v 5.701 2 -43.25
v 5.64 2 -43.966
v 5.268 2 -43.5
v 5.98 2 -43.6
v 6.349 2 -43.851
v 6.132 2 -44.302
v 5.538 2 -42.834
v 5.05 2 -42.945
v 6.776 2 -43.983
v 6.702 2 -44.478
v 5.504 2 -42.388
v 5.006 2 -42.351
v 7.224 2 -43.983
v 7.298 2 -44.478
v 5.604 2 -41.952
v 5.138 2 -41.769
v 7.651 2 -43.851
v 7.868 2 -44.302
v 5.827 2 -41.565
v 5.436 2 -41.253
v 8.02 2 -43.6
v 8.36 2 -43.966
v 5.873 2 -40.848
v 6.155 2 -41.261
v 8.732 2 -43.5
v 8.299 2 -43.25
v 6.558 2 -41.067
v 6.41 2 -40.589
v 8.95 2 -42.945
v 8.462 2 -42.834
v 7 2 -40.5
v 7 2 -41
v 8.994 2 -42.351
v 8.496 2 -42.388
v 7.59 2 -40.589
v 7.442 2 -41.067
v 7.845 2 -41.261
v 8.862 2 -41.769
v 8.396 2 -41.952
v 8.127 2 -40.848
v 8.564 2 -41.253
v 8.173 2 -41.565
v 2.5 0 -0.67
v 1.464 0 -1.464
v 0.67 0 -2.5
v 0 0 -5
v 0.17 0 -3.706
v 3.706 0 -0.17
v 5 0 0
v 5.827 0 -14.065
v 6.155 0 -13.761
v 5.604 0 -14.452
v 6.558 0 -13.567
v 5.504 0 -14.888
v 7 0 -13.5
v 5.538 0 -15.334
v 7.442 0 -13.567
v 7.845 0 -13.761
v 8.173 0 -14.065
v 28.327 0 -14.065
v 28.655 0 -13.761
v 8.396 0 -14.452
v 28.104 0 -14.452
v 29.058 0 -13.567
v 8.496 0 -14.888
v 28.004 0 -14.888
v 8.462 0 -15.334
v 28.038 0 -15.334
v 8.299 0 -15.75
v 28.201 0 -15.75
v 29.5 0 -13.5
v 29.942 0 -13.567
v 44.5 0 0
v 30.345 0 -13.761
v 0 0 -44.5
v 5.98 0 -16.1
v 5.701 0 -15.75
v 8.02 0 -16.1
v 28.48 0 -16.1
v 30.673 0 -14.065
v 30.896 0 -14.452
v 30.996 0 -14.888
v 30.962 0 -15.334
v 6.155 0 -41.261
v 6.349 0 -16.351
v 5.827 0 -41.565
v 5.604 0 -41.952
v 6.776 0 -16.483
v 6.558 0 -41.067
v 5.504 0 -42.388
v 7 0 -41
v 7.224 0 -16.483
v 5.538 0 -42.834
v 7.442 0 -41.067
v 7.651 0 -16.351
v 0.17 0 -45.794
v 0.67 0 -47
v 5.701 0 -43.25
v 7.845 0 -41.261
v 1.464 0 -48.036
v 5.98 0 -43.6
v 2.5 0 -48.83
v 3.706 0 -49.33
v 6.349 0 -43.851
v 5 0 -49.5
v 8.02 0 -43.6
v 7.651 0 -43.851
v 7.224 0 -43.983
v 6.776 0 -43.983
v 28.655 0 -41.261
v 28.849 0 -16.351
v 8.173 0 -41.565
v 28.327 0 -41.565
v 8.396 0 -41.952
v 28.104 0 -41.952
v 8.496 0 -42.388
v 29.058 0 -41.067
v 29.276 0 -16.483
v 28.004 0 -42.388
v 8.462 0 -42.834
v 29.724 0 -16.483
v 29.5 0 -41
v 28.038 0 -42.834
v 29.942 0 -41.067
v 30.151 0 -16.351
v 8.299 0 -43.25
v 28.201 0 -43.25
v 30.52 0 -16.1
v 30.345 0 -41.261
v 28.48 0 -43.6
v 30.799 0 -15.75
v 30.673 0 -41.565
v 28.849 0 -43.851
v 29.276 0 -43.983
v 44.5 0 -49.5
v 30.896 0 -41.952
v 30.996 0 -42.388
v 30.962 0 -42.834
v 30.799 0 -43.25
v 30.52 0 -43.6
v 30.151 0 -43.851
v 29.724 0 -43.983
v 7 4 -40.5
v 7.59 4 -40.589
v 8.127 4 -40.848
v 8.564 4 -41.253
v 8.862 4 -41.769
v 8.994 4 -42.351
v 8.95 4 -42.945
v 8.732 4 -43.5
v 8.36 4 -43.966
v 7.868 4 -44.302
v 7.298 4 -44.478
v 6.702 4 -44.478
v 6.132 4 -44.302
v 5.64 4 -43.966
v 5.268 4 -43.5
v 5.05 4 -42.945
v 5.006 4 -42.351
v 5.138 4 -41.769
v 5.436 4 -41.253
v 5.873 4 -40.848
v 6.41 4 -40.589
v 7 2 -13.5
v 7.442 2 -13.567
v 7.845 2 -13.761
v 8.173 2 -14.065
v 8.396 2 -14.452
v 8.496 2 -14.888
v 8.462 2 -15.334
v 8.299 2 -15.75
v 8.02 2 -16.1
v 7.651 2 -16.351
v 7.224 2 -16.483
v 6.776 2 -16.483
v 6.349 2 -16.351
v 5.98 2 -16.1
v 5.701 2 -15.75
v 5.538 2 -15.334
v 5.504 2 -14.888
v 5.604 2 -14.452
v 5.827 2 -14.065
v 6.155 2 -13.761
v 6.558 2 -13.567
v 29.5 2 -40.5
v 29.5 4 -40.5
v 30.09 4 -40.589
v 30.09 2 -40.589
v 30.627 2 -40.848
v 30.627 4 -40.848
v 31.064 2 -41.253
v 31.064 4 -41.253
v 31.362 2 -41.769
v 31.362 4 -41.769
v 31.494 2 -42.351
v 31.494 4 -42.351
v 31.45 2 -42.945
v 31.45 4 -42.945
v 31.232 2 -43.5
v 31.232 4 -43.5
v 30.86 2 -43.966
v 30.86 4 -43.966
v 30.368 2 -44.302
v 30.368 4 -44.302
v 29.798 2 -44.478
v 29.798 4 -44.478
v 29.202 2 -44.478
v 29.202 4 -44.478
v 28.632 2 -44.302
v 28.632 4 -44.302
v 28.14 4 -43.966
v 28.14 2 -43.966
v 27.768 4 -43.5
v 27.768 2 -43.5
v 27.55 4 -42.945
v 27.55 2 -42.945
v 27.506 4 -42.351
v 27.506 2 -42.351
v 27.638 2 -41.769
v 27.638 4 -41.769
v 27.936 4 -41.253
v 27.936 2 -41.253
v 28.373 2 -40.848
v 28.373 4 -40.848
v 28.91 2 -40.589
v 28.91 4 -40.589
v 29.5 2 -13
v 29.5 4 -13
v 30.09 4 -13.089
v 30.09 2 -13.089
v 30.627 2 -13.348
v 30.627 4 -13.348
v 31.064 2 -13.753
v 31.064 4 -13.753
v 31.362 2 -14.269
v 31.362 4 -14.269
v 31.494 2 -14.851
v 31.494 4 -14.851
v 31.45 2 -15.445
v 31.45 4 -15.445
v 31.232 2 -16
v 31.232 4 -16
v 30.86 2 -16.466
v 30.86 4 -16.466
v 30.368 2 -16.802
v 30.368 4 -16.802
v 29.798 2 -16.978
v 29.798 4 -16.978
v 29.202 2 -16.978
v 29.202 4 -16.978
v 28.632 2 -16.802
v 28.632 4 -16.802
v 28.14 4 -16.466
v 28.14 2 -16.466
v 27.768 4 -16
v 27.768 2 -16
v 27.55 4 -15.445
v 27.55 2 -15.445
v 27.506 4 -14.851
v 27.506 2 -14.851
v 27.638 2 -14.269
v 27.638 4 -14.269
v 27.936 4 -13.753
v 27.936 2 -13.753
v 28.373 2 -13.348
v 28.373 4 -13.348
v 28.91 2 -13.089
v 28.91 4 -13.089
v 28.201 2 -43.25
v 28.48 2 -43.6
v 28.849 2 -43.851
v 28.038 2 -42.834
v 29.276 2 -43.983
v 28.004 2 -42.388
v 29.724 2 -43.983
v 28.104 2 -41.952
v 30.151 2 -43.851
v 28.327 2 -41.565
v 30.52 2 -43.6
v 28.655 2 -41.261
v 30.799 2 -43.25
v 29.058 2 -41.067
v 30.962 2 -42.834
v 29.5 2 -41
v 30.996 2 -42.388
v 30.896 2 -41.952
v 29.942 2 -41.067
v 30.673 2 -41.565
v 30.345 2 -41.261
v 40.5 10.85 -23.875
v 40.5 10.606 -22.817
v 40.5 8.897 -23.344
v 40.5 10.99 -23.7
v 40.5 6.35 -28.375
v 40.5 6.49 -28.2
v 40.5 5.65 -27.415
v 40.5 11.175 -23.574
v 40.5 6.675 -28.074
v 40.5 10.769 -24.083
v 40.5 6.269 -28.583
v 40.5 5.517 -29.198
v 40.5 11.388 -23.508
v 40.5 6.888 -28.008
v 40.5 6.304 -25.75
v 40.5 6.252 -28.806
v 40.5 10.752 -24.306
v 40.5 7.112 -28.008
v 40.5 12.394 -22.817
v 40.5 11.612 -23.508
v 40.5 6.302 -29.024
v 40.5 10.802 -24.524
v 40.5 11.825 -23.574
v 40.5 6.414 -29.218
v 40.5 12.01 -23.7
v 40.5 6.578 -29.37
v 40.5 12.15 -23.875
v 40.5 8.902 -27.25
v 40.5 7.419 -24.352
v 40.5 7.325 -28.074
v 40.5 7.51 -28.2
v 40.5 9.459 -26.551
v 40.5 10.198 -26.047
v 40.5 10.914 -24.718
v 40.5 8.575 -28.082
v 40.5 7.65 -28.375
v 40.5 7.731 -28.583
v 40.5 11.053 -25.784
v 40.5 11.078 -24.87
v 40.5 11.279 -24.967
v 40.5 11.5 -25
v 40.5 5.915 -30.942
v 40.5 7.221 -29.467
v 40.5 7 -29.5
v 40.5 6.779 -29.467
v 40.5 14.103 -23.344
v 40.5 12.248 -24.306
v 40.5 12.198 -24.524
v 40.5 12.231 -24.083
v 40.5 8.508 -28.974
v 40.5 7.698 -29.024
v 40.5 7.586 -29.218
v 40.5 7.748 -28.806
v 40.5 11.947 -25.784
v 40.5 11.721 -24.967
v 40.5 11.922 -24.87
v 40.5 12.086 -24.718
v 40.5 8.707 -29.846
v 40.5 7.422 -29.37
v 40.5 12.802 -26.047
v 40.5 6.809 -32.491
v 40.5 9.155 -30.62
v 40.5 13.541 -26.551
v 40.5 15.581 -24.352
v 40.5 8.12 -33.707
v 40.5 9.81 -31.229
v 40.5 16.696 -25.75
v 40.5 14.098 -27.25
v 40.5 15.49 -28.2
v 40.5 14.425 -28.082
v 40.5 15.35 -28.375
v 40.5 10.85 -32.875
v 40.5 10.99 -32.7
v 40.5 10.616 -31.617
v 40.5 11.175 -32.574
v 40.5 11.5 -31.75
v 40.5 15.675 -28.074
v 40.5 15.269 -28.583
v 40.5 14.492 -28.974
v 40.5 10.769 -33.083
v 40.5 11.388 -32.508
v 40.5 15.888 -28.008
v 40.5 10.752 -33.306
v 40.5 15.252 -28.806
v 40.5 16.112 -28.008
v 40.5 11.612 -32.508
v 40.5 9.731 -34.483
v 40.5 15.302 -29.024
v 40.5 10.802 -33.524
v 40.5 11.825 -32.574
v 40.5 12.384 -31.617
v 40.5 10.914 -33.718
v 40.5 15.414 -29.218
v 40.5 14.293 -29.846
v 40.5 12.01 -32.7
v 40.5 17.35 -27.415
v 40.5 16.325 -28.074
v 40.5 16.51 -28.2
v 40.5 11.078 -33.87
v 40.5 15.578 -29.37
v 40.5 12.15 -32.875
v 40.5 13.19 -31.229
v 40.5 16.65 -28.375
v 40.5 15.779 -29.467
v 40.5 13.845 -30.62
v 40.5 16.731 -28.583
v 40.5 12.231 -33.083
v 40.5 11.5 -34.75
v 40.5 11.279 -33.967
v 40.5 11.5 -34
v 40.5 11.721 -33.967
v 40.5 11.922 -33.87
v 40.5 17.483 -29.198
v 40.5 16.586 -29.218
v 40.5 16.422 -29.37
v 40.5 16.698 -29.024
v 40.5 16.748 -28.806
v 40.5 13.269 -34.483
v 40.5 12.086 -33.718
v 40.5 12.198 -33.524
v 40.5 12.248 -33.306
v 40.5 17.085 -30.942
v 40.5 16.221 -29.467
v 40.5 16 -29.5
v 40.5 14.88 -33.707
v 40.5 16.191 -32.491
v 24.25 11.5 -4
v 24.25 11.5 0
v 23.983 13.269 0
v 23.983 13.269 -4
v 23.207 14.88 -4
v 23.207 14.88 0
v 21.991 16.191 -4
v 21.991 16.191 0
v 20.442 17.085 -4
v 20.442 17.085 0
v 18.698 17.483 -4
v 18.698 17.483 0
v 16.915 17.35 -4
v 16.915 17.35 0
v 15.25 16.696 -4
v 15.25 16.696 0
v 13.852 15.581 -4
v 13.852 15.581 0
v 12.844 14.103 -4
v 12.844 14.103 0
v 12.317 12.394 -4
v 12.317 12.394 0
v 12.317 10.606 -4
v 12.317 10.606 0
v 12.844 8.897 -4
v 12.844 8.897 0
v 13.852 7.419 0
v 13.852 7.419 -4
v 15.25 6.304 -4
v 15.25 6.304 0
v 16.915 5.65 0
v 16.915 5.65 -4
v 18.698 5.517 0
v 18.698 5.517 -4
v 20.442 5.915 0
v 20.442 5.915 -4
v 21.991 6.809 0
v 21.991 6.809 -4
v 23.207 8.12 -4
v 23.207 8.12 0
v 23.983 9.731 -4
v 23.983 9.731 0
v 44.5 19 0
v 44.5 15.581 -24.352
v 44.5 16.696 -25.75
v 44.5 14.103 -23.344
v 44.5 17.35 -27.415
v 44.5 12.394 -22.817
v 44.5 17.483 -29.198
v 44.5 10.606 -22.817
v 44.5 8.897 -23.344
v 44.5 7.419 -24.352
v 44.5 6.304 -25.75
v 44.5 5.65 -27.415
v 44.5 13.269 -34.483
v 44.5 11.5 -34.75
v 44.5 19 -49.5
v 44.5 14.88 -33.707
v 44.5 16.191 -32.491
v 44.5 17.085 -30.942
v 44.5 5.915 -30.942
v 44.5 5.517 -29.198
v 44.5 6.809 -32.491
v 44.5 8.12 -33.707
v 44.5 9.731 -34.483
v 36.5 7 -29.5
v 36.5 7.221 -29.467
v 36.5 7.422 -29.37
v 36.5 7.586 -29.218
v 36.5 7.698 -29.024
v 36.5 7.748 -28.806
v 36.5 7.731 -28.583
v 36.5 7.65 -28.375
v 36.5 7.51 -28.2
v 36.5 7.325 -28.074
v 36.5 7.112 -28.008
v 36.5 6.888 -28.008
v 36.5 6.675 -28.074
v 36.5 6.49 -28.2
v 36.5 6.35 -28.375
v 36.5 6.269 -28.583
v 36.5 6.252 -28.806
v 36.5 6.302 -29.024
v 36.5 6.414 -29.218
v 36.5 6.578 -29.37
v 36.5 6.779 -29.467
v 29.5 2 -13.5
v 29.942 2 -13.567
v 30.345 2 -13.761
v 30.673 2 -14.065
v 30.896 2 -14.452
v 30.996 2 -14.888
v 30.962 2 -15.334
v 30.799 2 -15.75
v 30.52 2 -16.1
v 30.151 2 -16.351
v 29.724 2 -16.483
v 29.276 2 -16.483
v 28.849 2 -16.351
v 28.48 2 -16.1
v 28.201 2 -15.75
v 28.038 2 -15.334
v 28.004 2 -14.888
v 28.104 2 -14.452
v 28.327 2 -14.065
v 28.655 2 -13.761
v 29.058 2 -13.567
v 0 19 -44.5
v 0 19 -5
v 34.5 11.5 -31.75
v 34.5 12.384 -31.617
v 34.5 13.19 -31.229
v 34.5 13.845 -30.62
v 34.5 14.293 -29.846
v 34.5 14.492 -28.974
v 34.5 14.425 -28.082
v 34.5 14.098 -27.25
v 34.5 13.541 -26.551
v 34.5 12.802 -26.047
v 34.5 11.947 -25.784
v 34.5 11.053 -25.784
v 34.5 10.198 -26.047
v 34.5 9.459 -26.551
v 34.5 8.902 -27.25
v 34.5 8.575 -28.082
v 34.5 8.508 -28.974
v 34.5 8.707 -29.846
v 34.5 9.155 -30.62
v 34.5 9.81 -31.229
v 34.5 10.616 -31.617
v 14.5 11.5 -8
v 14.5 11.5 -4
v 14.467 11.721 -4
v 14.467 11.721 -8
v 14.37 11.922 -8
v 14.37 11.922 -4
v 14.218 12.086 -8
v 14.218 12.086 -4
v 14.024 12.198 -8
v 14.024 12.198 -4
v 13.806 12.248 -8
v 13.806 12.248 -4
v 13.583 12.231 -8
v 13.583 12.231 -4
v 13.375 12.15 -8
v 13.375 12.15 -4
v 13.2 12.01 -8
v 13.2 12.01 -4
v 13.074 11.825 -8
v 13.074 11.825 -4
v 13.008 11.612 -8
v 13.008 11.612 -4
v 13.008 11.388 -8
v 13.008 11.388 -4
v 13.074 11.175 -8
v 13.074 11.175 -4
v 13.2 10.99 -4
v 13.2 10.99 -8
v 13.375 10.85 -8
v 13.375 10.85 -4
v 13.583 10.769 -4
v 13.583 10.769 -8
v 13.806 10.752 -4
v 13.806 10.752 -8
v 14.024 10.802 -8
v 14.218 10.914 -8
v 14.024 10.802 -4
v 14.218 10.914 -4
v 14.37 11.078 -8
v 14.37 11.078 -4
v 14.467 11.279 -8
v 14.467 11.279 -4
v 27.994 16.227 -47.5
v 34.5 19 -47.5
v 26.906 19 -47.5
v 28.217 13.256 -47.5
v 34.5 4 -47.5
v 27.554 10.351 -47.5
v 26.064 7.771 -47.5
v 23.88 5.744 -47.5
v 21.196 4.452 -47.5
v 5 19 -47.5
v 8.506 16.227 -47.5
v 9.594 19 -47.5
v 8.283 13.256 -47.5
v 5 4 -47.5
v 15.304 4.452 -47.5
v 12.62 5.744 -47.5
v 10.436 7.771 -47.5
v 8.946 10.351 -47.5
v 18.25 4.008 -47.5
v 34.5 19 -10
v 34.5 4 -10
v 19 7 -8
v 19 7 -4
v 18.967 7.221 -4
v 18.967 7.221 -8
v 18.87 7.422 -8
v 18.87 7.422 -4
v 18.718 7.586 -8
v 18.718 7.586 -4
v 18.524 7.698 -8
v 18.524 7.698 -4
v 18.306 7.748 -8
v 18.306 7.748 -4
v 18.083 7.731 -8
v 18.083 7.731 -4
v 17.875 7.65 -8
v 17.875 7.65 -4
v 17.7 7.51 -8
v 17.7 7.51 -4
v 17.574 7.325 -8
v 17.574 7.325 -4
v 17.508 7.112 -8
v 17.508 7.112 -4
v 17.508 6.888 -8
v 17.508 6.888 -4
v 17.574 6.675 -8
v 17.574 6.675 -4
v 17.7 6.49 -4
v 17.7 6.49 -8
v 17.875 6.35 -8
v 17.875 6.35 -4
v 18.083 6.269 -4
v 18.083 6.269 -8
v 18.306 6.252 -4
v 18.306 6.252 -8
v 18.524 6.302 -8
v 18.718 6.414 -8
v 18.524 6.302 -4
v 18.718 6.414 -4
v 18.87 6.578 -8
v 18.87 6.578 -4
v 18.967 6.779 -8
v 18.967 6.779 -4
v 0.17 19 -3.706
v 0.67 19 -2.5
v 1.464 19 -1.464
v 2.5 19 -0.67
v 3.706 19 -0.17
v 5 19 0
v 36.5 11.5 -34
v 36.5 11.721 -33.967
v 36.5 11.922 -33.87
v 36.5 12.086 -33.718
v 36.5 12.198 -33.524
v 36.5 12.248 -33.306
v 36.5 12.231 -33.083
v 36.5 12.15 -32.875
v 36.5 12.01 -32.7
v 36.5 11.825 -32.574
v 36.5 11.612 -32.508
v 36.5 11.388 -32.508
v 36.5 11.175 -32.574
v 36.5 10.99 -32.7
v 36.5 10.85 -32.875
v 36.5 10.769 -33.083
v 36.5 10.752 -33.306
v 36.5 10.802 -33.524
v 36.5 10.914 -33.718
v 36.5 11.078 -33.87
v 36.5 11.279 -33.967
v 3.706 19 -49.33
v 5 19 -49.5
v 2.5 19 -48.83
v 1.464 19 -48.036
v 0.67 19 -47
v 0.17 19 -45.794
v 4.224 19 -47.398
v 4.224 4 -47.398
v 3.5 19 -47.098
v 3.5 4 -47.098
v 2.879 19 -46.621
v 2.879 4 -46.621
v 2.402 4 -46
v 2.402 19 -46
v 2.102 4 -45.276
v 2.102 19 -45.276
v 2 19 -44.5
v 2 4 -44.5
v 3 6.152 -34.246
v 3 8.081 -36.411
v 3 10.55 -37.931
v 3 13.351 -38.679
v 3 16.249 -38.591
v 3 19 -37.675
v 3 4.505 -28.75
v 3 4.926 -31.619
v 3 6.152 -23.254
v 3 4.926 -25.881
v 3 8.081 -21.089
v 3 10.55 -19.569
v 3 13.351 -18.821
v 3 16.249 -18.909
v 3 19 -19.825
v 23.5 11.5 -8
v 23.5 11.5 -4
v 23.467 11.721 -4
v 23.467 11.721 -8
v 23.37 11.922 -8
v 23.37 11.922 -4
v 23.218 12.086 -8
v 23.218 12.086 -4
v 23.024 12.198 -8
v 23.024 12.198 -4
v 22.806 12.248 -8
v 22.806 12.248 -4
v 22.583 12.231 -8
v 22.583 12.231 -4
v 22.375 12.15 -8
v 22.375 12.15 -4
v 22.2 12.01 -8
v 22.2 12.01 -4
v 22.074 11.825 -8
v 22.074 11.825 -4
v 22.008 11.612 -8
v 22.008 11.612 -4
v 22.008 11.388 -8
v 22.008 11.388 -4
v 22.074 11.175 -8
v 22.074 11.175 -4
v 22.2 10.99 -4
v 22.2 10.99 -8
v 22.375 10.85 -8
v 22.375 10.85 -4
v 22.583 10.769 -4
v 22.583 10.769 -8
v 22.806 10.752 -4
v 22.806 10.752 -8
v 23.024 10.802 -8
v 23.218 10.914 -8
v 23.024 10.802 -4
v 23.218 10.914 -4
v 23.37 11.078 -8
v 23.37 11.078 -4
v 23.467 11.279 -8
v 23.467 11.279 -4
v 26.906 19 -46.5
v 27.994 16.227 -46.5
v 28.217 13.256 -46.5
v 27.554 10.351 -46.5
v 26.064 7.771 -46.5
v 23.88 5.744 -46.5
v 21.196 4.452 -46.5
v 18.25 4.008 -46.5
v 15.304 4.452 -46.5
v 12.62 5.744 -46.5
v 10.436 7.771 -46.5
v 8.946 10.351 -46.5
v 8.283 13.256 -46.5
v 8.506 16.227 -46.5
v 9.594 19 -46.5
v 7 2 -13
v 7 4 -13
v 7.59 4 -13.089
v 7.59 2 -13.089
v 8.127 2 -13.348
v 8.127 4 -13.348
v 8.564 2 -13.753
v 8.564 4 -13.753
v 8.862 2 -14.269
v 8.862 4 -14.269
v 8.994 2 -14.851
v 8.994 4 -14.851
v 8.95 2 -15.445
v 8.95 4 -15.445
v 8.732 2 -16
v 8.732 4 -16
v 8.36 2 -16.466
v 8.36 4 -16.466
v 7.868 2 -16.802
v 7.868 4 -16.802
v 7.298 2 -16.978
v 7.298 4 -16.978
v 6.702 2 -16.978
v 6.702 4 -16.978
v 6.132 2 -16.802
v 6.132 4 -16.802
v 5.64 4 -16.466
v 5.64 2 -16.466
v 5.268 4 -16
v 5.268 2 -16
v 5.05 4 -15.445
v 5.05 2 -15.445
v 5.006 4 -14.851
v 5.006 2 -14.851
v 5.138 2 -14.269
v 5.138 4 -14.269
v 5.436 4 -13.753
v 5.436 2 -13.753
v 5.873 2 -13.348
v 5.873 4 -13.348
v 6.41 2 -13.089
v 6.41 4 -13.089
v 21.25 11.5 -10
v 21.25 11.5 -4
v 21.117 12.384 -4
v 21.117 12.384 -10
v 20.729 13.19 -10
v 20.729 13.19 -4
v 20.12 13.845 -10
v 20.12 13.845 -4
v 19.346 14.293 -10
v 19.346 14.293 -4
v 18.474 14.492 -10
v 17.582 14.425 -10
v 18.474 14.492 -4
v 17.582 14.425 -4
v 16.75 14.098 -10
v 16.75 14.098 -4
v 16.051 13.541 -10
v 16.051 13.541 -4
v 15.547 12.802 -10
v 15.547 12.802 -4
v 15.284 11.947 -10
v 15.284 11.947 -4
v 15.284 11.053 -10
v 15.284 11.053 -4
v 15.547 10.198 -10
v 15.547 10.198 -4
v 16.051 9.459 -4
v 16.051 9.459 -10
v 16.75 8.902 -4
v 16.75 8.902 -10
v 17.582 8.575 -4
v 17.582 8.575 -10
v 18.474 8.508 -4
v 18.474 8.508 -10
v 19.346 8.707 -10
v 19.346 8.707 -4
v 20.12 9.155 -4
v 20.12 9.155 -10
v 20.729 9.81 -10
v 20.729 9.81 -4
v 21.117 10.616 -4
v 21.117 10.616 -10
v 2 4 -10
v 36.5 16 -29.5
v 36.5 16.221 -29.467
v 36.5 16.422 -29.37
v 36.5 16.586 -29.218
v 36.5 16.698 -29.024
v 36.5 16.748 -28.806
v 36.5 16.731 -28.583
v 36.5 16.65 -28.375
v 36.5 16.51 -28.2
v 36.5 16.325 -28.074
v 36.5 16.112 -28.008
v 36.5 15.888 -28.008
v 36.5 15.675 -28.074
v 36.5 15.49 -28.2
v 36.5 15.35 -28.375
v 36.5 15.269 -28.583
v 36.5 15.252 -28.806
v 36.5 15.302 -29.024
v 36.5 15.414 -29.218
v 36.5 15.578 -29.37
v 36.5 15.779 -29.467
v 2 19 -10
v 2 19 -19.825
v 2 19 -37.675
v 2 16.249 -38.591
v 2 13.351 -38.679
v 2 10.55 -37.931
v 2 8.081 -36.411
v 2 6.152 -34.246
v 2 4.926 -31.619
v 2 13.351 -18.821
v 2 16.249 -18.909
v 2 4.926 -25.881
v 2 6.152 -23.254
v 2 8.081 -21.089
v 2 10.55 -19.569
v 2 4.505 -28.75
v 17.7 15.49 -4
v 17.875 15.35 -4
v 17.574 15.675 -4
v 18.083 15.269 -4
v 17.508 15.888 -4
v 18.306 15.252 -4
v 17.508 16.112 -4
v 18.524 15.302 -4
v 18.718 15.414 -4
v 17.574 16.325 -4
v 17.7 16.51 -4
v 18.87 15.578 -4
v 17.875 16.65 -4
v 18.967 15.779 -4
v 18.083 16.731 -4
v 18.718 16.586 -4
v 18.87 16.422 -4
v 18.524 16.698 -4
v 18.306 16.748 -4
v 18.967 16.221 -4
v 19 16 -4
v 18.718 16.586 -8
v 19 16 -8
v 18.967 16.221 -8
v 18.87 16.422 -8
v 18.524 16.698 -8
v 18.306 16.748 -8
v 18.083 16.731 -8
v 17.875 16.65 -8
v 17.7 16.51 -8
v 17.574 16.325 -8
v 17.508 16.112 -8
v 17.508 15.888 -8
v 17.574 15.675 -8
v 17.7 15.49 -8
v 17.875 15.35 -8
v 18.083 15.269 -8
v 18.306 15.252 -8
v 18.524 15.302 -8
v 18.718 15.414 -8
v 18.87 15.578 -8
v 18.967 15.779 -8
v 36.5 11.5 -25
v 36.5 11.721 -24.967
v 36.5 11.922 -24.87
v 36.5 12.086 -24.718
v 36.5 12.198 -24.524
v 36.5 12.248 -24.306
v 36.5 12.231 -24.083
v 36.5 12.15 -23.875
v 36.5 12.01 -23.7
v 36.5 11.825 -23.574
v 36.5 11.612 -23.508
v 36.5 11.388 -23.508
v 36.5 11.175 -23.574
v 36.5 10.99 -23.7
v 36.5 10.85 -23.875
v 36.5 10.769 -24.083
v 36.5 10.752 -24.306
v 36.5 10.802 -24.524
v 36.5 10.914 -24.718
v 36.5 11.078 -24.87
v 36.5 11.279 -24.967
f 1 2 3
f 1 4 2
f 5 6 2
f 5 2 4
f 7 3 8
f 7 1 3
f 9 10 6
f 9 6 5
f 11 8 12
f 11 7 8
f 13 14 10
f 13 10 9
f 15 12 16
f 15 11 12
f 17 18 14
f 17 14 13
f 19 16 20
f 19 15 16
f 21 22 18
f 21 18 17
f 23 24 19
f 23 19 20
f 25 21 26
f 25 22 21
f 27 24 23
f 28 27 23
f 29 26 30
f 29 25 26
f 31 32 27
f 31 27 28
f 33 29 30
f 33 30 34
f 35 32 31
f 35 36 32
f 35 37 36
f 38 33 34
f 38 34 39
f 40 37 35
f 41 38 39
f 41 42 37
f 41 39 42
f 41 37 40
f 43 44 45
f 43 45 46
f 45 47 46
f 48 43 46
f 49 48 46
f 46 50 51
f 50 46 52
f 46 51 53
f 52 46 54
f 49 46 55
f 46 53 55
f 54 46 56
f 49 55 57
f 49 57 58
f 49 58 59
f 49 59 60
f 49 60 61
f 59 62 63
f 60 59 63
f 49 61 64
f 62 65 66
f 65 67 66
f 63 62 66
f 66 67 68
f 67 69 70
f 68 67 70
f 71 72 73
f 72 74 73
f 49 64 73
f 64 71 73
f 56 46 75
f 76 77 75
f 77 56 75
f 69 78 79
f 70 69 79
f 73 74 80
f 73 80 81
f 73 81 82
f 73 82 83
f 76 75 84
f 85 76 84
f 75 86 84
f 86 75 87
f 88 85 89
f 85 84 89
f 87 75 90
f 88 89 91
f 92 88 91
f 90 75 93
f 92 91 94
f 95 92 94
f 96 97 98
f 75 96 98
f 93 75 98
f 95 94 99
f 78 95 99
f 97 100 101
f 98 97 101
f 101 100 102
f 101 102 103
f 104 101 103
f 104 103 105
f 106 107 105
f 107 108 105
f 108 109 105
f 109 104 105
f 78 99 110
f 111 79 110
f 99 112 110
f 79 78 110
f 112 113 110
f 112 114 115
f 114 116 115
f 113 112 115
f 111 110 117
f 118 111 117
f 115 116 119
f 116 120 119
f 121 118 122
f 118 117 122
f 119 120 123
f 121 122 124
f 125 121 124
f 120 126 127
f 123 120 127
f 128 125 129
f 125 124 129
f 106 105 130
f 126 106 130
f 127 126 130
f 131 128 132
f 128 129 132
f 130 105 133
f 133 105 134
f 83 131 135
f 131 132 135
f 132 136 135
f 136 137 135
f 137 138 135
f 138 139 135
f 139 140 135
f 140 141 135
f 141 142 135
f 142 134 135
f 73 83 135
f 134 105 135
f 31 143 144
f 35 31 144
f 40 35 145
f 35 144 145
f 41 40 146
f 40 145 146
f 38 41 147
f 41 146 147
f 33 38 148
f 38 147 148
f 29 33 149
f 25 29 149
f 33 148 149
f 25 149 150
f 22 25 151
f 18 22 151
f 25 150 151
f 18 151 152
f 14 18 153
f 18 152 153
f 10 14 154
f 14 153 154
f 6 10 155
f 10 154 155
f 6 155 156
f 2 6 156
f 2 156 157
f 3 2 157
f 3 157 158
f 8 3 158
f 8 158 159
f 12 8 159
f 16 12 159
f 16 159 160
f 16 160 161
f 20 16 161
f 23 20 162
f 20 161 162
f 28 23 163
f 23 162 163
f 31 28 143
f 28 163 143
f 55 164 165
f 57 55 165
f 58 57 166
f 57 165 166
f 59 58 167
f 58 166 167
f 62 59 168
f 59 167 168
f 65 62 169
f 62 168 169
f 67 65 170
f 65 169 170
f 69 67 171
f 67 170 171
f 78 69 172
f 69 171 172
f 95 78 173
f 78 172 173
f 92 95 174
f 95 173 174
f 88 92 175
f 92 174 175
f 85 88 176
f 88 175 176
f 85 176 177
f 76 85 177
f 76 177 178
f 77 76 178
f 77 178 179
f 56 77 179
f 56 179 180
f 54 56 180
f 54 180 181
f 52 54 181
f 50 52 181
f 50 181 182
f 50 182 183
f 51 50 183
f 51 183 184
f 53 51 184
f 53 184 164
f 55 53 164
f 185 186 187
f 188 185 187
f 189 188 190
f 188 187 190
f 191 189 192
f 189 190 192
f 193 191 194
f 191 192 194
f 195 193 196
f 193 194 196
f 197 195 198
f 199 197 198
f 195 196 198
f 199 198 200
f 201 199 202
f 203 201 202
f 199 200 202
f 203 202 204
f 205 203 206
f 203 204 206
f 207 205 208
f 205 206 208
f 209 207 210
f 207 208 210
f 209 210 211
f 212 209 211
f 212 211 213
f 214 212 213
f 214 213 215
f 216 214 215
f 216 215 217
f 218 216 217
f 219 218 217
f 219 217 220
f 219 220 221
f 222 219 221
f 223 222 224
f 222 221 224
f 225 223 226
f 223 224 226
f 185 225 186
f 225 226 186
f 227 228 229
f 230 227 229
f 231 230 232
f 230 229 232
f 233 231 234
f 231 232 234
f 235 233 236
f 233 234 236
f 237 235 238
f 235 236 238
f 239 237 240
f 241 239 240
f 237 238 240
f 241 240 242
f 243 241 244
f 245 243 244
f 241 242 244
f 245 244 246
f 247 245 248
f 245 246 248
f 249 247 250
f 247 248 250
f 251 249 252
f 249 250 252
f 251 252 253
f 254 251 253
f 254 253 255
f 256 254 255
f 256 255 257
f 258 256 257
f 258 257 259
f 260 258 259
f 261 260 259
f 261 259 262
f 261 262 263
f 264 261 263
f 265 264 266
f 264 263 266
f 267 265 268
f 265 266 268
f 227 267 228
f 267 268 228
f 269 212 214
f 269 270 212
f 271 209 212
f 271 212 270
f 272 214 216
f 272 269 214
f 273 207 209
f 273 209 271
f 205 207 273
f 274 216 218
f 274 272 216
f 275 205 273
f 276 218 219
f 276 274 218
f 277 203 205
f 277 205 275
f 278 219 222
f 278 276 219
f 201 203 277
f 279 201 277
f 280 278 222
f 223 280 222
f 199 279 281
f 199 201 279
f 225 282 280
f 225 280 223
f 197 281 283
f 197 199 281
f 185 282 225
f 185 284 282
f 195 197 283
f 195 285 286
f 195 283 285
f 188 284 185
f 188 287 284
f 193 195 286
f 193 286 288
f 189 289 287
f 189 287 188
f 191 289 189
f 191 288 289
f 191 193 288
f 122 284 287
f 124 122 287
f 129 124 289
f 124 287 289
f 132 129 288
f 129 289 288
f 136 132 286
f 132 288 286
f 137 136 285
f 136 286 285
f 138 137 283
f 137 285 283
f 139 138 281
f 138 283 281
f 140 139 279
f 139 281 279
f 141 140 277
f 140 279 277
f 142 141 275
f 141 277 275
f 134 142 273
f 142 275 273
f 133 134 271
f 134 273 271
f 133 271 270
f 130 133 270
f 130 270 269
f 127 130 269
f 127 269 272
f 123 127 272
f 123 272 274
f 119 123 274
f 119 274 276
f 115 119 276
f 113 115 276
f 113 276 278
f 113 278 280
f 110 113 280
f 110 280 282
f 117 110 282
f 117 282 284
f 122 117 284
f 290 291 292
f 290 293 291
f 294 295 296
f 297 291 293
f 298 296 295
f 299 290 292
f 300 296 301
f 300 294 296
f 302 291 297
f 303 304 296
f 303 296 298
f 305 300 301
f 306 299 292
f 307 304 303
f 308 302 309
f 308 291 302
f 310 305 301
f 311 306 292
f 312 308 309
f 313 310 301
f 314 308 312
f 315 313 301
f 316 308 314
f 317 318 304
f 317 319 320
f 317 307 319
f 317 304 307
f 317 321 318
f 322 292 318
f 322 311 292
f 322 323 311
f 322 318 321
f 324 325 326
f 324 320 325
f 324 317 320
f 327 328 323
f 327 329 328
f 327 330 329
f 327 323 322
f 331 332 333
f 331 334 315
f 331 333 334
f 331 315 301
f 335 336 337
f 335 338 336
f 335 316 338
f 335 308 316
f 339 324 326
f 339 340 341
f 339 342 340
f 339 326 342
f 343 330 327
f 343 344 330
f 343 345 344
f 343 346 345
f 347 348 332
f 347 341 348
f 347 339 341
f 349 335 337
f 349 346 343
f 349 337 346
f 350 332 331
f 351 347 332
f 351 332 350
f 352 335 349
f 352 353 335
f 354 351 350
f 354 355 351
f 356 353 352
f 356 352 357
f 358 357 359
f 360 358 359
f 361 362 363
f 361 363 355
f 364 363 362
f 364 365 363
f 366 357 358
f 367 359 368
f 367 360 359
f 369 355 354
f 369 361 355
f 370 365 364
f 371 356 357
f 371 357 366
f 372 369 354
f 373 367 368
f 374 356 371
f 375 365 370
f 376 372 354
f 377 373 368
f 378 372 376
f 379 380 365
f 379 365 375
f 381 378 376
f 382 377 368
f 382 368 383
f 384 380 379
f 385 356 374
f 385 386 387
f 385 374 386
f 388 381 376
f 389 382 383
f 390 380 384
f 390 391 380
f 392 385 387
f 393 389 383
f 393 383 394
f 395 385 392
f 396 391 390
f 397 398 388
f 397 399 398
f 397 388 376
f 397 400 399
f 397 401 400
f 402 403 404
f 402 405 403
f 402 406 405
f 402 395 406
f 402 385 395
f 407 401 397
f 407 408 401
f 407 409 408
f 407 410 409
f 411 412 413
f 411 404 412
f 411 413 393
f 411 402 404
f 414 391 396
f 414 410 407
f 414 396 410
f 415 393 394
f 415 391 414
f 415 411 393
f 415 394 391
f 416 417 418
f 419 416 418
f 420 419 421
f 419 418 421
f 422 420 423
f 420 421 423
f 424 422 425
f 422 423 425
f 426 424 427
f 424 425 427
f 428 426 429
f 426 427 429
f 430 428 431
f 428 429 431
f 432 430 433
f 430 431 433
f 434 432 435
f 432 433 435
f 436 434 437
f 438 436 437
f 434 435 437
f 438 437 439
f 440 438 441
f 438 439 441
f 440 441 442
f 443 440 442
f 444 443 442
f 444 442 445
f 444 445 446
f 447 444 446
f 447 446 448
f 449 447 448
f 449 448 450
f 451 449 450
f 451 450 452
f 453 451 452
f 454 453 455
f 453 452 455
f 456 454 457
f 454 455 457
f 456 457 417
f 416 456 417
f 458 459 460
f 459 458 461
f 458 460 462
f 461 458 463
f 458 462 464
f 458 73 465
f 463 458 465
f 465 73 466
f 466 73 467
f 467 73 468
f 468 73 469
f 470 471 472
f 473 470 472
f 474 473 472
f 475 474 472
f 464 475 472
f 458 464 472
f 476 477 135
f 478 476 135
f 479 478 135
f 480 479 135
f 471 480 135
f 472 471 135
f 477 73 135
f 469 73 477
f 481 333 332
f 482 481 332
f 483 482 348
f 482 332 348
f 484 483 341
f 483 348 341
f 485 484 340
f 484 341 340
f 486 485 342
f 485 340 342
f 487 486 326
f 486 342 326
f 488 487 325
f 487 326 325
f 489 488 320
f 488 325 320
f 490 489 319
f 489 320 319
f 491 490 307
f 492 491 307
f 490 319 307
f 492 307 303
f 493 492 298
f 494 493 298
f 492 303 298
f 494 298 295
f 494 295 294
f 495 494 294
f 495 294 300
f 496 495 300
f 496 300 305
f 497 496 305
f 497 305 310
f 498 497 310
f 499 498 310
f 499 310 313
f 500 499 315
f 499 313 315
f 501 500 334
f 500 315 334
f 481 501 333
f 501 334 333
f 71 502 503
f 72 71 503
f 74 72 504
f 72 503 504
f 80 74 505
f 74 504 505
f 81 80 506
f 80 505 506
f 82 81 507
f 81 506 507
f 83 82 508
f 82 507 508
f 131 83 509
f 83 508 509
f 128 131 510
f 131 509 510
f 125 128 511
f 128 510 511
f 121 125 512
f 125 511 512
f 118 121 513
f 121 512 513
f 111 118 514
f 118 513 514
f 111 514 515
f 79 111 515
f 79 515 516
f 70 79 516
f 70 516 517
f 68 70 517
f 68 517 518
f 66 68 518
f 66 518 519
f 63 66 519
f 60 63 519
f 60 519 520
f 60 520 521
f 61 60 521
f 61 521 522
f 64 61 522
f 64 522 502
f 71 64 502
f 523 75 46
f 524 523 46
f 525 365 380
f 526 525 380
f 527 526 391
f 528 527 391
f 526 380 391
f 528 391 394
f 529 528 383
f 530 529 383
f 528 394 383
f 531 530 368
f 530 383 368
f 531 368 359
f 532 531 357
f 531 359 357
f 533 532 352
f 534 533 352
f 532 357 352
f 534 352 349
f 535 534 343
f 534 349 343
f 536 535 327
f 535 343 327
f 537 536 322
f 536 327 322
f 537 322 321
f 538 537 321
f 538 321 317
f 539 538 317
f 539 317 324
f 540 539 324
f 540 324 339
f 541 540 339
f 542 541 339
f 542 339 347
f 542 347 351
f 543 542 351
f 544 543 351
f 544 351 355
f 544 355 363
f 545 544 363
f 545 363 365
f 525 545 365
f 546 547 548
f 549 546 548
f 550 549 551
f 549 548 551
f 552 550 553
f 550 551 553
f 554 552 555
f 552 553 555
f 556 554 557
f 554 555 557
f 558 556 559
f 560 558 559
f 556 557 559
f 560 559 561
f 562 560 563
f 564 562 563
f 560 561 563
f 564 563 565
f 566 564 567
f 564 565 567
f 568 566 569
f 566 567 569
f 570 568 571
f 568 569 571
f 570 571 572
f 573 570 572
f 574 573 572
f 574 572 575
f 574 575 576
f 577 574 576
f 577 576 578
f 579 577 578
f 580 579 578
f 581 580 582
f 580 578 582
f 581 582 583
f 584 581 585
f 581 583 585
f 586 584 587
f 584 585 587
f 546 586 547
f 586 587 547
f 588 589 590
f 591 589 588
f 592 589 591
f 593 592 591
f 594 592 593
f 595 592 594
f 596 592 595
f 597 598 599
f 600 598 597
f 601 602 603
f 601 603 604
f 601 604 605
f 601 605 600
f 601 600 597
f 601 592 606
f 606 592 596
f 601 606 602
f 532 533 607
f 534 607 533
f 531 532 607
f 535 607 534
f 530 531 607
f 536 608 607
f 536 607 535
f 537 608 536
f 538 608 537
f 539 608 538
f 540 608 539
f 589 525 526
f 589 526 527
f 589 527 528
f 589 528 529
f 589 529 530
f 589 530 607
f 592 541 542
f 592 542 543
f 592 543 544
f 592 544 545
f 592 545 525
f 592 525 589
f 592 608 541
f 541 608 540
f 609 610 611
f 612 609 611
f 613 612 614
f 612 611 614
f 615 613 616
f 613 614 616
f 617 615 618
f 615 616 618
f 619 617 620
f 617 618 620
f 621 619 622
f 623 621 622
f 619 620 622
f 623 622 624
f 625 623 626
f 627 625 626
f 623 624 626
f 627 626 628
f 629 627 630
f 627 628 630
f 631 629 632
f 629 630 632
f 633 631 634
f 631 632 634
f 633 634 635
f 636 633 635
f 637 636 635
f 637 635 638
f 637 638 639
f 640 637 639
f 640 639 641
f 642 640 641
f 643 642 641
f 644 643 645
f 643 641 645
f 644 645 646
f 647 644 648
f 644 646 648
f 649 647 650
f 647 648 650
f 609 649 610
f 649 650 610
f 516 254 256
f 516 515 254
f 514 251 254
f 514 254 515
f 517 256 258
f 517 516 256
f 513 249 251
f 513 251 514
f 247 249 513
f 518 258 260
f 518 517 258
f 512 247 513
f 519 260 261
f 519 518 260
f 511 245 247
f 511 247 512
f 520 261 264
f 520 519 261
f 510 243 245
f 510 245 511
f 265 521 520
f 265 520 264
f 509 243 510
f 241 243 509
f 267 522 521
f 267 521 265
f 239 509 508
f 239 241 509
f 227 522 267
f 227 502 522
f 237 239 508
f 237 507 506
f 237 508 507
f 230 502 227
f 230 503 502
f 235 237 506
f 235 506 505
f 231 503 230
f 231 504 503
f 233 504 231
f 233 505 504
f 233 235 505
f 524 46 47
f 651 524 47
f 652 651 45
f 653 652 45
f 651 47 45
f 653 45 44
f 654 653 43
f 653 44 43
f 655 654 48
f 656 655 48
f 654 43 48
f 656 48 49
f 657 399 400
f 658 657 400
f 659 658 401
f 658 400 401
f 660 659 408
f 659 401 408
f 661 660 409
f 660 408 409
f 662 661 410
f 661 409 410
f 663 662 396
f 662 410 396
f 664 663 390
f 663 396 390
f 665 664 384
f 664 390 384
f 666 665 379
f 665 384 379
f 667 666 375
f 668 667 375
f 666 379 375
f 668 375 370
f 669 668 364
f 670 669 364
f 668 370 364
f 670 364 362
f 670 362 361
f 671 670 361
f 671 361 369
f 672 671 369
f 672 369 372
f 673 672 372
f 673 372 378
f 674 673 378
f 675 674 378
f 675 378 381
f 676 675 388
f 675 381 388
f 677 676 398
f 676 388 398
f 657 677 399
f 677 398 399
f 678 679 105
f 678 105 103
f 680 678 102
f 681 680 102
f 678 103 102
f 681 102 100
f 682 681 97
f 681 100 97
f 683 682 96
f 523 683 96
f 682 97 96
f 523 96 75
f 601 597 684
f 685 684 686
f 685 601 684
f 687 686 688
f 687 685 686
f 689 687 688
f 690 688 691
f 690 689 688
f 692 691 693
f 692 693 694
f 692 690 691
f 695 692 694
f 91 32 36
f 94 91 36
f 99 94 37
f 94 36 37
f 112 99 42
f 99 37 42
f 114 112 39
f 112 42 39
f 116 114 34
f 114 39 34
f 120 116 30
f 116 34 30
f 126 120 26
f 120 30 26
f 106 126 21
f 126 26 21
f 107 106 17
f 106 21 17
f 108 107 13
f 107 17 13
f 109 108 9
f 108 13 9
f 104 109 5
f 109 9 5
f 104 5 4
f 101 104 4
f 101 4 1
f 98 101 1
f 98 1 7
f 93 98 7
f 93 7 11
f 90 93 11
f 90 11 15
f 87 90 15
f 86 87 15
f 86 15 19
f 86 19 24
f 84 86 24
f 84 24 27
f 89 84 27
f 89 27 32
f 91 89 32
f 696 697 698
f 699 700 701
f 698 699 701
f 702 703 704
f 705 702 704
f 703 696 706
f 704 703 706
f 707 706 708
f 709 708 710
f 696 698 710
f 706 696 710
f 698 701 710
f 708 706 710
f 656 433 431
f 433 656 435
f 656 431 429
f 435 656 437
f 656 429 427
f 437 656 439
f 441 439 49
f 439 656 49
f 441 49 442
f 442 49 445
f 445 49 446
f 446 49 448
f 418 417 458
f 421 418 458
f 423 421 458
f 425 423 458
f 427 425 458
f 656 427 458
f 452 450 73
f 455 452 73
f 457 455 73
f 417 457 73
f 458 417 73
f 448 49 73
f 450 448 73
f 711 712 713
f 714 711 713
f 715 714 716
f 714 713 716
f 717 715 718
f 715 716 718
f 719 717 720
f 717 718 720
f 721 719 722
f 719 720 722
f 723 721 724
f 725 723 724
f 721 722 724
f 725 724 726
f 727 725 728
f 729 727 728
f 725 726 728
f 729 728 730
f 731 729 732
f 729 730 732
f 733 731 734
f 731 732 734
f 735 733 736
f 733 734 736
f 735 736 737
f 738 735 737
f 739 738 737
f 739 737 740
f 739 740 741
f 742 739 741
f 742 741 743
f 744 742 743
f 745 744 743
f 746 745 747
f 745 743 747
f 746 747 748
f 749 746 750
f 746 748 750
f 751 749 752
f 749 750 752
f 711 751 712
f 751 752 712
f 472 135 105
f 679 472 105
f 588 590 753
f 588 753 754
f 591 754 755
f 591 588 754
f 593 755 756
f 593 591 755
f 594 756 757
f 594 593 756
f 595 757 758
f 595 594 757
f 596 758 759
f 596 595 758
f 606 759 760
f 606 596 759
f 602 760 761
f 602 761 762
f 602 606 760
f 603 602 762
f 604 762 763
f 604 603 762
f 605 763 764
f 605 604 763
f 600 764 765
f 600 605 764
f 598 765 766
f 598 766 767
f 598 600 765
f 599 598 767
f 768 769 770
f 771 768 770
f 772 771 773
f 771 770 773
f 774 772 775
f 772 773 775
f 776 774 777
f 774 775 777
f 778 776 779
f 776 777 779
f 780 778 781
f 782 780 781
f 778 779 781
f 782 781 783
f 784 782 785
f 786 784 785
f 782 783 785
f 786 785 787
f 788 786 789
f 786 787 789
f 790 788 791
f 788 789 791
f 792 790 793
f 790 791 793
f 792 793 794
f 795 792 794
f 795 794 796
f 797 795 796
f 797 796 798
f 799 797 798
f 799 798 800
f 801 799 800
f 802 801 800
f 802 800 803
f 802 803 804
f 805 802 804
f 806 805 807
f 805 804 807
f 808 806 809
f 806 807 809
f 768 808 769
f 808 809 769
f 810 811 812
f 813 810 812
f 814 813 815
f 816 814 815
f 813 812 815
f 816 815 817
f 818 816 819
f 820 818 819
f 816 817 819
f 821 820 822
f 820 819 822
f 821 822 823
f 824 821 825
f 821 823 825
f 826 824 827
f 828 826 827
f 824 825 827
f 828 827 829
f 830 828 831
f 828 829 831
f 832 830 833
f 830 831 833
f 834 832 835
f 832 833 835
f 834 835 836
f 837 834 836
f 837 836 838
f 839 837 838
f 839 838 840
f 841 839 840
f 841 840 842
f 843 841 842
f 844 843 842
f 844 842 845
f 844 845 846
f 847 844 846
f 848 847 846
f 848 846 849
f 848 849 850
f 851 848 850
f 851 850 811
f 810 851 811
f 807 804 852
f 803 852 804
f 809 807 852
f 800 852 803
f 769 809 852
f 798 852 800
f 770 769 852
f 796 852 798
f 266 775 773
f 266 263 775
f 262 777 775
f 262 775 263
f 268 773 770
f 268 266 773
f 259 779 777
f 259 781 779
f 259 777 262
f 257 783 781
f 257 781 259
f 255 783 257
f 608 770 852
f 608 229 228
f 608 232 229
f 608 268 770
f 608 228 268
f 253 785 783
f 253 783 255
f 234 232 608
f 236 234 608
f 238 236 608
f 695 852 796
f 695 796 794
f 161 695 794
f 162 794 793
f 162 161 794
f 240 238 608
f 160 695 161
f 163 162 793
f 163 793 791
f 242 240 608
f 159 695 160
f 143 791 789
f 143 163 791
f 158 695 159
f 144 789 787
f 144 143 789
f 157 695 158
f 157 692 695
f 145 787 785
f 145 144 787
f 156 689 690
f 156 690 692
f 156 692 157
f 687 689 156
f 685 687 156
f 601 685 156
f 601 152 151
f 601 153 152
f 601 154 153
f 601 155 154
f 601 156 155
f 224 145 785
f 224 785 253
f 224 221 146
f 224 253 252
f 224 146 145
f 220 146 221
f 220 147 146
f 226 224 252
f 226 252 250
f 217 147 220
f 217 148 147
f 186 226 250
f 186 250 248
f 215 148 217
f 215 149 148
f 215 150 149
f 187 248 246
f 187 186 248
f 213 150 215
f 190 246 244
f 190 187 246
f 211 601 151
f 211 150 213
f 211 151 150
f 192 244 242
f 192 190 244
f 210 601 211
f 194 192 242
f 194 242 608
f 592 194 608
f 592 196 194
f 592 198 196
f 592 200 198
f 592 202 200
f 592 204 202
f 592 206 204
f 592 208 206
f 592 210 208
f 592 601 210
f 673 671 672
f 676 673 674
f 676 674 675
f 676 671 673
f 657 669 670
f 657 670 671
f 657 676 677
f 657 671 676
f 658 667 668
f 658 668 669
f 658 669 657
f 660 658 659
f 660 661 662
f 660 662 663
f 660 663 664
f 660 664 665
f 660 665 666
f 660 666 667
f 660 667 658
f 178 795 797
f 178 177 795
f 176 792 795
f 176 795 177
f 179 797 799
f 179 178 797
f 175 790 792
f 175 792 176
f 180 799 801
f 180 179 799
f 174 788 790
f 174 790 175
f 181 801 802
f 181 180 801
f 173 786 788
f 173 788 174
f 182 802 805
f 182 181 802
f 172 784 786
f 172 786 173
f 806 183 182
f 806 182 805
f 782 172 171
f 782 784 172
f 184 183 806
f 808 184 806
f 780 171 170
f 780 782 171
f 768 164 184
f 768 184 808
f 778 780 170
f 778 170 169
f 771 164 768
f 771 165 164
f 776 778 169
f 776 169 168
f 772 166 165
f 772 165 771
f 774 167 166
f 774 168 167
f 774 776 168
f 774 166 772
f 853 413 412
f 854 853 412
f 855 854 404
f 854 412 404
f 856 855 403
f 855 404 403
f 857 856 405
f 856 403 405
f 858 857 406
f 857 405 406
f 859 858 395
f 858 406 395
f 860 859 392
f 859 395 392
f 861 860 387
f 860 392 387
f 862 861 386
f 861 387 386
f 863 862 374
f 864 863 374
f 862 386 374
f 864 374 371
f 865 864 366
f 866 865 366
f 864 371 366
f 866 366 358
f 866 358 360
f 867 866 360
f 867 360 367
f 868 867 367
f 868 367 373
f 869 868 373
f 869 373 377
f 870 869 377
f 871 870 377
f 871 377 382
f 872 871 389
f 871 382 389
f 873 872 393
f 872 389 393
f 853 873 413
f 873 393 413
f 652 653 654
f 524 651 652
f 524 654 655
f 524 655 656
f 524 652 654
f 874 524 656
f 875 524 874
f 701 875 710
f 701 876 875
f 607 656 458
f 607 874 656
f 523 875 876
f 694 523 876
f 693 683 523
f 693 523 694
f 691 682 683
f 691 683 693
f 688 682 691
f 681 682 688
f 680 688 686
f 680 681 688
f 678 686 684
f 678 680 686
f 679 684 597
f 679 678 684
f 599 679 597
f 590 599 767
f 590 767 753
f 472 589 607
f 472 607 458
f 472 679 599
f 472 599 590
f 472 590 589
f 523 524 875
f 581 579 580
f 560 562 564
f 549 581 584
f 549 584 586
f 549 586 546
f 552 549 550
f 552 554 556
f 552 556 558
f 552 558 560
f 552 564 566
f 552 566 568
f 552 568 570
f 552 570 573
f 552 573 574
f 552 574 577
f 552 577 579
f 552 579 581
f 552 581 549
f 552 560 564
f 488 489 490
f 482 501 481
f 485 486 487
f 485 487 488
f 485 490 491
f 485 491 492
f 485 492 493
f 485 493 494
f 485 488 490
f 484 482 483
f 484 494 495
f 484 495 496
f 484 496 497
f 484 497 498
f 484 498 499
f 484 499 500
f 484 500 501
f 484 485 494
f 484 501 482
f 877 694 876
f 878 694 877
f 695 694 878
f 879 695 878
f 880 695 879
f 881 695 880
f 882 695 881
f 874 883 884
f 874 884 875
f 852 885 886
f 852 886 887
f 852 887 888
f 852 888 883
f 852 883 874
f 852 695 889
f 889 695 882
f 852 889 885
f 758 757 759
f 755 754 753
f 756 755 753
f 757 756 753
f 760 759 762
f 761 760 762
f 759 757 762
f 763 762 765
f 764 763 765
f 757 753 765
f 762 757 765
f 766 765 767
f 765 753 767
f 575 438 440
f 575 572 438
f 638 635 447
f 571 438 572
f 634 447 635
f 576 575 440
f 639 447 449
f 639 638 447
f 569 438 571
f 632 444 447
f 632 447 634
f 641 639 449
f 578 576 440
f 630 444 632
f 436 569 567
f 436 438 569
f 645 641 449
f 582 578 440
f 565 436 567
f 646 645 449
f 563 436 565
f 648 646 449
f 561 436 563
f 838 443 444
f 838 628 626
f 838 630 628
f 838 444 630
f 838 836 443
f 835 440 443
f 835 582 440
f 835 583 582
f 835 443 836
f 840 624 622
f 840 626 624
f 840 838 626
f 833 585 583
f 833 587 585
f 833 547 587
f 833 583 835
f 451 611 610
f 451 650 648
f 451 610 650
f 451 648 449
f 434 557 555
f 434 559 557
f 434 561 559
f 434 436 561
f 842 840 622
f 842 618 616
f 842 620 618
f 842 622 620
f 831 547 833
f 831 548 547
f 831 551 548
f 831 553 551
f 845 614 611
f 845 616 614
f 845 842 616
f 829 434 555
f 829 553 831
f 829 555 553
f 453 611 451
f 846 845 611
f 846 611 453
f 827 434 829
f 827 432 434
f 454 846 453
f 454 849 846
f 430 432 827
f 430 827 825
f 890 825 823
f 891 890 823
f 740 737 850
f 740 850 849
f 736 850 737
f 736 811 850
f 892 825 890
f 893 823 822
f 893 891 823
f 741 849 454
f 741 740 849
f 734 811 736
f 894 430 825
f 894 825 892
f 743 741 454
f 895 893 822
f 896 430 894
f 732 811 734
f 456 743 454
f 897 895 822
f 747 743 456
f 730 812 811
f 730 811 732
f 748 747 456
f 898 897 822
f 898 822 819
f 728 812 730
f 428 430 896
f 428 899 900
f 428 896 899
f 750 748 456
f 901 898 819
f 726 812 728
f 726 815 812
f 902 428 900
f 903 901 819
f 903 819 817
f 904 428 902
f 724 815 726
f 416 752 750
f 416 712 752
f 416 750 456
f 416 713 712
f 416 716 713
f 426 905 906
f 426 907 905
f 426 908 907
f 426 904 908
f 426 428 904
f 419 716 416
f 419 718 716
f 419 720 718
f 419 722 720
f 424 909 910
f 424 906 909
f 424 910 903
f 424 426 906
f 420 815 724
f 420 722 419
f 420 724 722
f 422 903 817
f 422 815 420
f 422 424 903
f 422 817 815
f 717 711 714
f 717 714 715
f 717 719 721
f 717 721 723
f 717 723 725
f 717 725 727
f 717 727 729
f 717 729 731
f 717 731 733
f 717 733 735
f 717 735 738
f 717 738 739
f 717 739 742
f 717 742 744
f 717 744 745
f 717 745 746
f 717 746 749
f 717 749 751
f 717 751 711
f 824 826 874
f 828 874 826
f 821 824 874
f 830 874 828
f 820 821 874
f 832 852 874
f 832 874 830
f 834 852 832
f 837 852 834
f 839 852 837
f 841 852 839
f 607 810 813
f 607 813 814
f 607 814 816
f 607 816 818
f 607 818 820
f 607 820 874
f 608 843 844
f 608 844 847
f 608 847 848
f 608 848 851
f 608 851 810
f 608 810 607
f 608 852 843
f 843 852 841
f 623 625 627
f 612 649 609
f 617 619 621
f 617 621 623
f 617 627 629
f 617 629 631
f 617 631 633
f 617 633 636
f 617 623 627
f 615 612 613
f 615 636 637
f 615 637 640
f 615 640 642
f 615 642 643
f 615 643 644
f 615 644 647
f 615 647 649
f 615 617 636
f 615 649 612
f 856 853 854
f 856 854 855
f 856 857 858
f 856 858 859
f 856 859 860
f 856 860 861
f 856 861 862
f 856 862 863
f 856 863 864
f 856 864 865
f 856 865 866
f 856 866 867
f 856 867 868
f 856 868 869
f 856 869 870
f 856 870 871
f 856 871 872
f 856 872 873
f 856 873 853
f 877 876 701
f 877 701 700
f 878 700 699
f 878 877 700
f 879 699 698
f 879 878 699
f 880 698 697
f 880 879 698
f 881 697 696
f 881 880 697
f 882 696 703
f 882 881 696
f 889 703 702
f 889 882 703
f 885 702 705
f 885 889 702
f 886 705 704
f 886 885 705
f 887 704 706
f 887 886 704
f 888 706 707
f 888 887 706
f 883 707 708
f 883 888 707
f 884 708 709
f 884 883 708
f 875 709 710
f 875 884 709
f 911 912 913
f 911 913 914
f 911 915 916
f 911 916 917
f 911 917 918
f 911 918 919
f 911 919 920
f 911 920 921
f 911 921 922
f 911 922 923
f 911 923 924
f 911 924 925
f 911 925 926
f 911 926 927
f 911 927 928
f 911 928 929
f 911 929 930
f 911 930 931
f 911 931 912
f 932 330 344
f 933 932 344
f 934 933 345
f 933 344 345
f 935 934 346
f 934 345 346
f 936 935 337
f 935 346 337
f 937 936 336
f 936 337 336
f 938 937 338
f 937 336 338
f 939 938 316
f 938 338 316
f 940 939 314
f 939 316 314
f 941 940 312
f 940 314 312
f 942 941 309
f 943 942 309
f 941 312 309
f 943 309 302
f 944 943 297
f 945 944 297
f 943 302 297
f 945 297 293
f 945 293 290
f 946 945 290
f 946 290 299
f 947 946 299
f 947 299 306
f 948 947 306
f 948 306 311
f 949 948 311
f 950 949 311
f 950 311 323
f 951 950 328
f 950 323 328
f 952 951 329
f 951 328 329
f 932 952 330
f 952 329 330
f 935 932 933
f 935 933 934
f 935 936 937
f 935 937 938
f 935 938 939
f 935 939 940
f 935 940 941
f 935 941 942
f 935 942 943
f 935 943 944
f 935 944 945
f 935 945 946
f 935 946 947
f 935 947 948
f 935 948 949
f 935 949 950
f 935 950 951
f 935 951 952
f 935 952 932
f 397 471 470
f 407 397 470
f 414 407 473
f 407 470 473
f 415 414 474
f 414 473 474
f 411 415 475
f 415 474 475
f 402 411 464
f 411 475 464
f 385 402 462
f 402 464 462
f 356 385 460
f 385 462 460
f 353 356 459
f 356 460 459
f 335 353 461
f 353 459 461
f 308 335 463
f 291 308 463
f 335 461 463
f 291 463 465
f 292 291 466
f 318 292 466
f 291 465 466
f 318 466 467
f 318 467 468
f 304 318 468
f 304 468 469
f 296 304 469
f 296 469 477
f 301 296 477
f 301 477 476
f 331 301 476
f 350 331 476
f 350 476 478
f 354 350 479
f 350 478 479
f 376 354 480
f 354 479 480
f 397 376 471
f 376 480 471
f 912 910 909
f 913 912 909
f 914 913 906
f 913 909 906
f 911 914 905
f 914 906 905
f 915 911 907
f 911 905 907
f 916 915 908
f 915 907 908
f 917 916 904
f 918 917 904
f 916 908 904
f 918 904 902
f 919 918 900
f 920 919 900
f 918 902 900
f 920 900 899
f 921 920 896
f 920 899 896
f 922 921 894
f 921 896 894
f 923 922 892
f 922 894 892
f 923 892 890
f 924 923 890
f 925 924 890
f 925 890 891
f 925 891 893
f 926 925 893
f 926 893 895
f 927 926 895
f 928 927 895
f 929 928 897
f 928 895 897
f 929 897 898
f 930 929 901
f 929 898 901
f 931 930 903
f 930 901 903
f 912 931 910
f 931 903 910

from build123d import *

# Parameters (mm, degrees)
EXTRUDE_1_DEPTH     = 19
SHELL_START         = 4
SHELL_2_DEPTH       = 15
SKETCH_2_R          = 3
CUT_EXTRUDE_1_DEPTH = 15
SKETCH_3_R          = 6
CUT_EXTRUDE_2_DEPTH = 4
SKETCH_4_R          = 3
CUT_EXTRUDE_3_DEPTH = 18
SKETCH_5_R          = 6
CUT_EXTRUDE_4_DEPTH = 4
SKETCH_8_R          = 0.75
CUT_EXTRUDE_5_DEPTH = 4
SKETCH_9_R          = 0.75
CUT_EXTRUDE_6_DEPTH = 4
EXTRUDE_4_DEPTH     = 1
EXTRUDE_5_DEPTH     = 1
SKETCH_13_R         = 2
CUT_EXTRUDE_7_DEPTH = 2
SKETCH_14_R         = 1.5
CUT_EXTRUDE_8_DEPTH = 9


# Read off the part's stored shape, not the designer's step: 抽壳2
with BuildPart() as part:
    # 草图1 → 凸台-拉伸1 (new body)
    with BuildSketch(Plane(origin=(0, 0, 0), x_dir=(1, 0, 0), z_dir=(0, 1, 0))):
        with BuildLine():
            Line((5, 0), (44.5, 0))
            Line((44.5, 0), (44.5, 49.5))
            Line((44.5, 49.5), (5, 49.5))
            ThreePointArc((5, 49.5), (1.464466094, 48.035533906), (0, 44.5))
            Line((0, 44.5), (0, 5))
            ThreePointArc((0, 5), (1.464466094, 1.464466094), (5, 0))
        make_face()
    extrude(amount=EXTRUDE_1_DEPTH)

    # 抽壳2 outline → 抽壳2 (cut)
    with BuildSketch(Plane(origin=(0, 0, 0), x_dir=(1, 0, 0), z_dir=(0, 1, 0)).offset(SHELL_START)):
        with BuildLine():
            ThreePointArc((5, 47.5), (2.878679656, 46.621320344), (2, 44.5))
            Line((2, 44.5), (2, 10))
            Line((2, 10), (34.5, 10))
            Line((34.5, 10), (34.5, 47.5))
            Line((34.5, 47.5), (5, 47.5))
        make_face()
    extrude(amount=SHELL_2_DEPTH, mode=Mode.SUBTRACT)

    # 草图2 → 切除-拉伸1 (cut)
    with BuildSketch(Plane.XY):
        with Locations((18.25, 11.5)):
            Circle(SKETCH_2_R)
    extrude(amount=-CUT_EXTRUDE_1_DEPTH, mode=Mode.SUBTRACT)

    # 草图3 → 切除-拉伸2 (cut)
    with BuildSketch(Plane.XY):
        with Locations((18.25, 11.5)):
            Circle(SKETCH_3_R)
    extrude(amount=-CUT_EXTRUDE_2_DEPTH, mode=Mode.SUBTRACT)

    # 草图4 → 切除-拉伸3 (cut)
    with BuildSketch(Plane(origin=(44.5, 0, 0), x_dir=(0, 0, -1), z_dir=(1, 0, 0))):
        with Locations((28.75, 11.5)):
            Circle(SKETCH_4_R)
    extrude(amount=-CUT_EXTRUDE_3_DEPTH, mode=Mode.SUBTRACT)

    # 草图5 → 切除-拉伸4 (cut)
    with BuildSketch(Plane(origin=(44.5, 0, 0), x_dir=(0, 0, -1), z_dir=(1, 0, 0))):
        with Locations((28.75, 11.5)):
            Circle(SKETCH_5_R)
    extrude(amount=-CUT_EXTRUDE_4_DEPTH, mode=Mode.SUBTRACT)

    # 草图8 → 切除-拉伸5 (cut)
    with BuildSketch(Plane(origin=(40.5, 0, 0), x_dir=(0, 0, -1), z_dir=(1, 0, 0))):
        with Locations((28.75, 16)):
            Circle(SKETCH_8_R)
        with Locations((33.25, 11.5)):
            Circle(SKETCH_8_R)
        with Locations((24.25, 11.5)):
            Circle(SKETCH_8_R)
        with Locations((28.75, 7)):
            Circle(SKETCH_8_R)
    extrude(amount=-CUT_EXTRUDE_5_DEPTH, mode=Mode.SUBTRACT)

    # 草图9 → 切除-拉伸6 (cut)
    with BuildSketch(Plane.XY.offset(-4)):
        with Locations((18.25, 16)):
            Circle(SKETCH_9_R)
        with Locations((22.75, 11.5)):
            Circle(SKETCH_9_R)
        with Locations((18.25, 7)):
            Circle(SKETCH_9_R)
        with Locations((13.75, 11.5)):
            Circle(SKETCH_9_R)
    extrude(amount=-CUT_EXTRUDE_6_DEPTH, mode=Mode.SUBTRACT)

    # 草图10 → 凸台-拉伸4 (add)
    with BuildSketch(Plane.XY.offset(-47.5)):
        with BuildLine():
            Line((9.594076089, 19), (26.905923911, 19))
            ThreePointArc((26.905923911, 19), (18.25, 4.0075), (9.594076089, 19))
        make_face()
    extrude(amount=EXTRUDE_4_DEPTH)

    # 草图11 → 凸台-拉伸5 (add)
    with BuildSketch(Plane(origin=(2, 0, 0), x_dir=(0, 0, -1), z_dir=(1, 0, 0))):
        with BuildLine():
            Line((19.825313731, 19), (37.674686269, 19))
            ThreePointArc((37.674686269, 19), (28.75, 4.505), (19.825313731, 19))
        make_face()
    extrude(amount=EXTRUDE_5_DEPTH)

    # 草图13 → 切除-拉伸7 (cut)
    with BuildSketch(Plane(origin=(0, 4, 0), x_dir=(1, 0, 0), z_dir=(0, 1, 0))):
        with Locations(Location((7, 15, 0), (0, 0, 270))):
            Circle(SKETCH_13_R)
        with Locations(Location((7, 42.5, 0), (0, 0, 270))):
            Circle(SKETCH_13_R)
        with Locations(Location((29.5, 15, 0), (0, 0, 270))):
            Circle(SKETCH_13_R)
        with Locations(Location((29.5, 42.5, 0), (0, 0, 270))):
            Circle(SKETCH_13_R)
    extrude(amount=-CUT_EXTRUDE_7_DEPTH, mode=Mode.SUBTRACT)

    # 草图14 → 切除-拉伸8 (cut)
    with BuildSketch(Plane(origin=(0, 4, 0), x_dir=(1, 0, 0), z_dir=(0, 1, 0))):
        with Locations(Location((7, 15, 0), (0, 0, 270))):
            Circle(SKETCH_14_R)
        with Locations(Location((7, 42.5, 0), (0, 0, 270))):
            Circle(SKETCH_14_R)
        with Locations(Location((29.5, 15, 0), (0, 0, 270))):
            Circle(SKETCH_14_R)
        with Locations(Location((29.5, 42.5, 0), (0, 0, 270))):
            Circle(SKETCH_14_R)
    extrude(amount=-CUT_EXTRUDE_8_DEPTH, mode=Mode.SUBTRACT)


solid = part.part
